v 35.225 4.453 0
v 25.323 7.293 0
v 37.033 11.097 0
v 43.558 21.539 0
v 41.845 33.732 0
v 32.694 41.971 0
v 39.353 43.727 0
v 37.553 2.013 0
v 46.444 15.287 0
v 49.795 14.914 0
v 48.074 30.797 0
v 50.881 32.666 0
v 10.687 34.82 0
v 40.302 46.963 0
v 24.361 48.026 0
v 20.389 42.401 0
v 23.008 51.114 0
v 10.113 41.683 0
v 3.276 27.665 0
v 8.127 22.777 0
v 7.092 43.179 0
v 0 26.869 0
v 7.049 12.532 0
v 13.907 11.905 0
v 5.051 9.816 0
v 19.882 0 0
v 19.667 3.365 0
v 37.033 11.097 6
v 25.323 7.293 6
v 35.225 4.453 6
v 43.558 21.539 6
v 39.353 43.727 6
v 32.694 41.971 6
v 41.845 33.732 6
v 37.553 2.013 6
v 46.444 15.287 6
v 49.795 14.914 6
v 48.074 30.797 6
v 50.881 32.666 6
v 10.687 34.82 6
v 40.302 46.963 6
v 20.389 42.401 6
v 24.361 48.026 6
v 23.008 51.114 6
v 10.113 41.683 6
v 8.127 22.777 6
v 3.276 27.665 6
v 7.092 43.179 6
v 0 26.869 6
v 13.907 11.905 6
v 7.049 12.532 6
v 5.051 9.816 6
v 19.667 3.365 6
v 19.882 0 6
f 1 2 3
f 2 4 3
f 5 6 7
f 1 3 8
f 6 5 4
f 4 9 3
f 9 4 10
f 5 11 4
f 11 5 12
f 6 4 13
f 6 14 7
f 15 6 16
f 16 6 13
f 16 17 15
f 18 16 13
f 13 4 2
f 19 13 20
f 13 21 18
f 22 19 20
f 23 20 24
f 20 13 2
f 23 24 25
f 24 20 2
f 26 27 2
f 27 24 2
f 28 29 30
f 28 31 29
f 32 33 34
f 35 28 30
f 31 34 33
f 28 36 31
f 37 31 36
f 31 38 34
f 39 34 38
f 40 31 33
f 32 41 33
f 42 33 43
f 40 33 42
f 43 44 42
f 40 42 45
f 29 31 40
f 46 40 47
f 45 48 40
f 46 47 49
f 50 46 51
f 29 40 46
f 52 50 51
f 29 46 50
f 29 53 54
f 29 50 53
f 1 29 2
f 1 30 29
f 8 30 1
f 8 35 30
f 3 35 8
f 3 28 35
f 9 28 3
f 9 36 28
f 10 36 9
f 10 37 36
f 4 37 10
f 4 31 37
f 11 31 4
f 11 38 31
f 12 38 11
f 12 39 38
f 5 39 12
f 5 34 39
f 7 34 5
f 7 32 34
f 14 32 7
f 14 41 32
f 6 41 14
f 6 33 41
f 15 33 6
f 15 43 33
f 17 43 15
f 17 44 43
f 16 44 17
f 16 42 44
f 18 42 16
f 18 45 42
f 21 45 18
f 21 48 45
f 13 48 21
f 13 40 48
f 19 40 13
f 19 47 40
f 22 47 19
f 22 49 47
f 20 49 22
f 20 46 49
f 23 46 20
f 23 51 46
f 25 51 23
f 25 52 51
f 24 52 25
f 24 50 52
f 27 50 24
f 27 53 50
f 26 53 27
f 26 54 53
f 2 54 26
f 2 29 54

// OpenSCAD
$fn = 32;
// ----------------------------------------------------------------------
// Fan rotor section: 9 blades, 18 mm hub radius, 8 mm blades
// ----------------------------------------------------------------------

// --- parameters (mm) ---
profile_height = 6;       // extrusion height
profile_points = 27;      // points of the closed outline

profile = [[43.558, 21.539], [48.074, 30.797], [50.881, 32.666], [41.845, 33.732], [39.353, 43.727], [40.302, 46.963], [32.694, 41.971], [24.361, 48.026], [23.008, 51.114], [20.389, 42.401], [10.113, 41.683], [7.092, 43.179], [10.687, 34.82], [3.276, 27.665], [0, 26.869], [8.127, 22.777], [7.049, 12.532], [5.051, 9.816], [13.907, 11.905], [19.667, 3.365], [19.882, 0], [25.323, 7.293], [35.225, 4.453], [37.553, 2.013], [37.033, 11.097], [46.444, 15.287], [49.795, 14.914]];  // single closed polygon, 27 points, counter clockwise

// --- the one profile operation ---
linear_extrude(height = profile_height) polygon(points = profile);
